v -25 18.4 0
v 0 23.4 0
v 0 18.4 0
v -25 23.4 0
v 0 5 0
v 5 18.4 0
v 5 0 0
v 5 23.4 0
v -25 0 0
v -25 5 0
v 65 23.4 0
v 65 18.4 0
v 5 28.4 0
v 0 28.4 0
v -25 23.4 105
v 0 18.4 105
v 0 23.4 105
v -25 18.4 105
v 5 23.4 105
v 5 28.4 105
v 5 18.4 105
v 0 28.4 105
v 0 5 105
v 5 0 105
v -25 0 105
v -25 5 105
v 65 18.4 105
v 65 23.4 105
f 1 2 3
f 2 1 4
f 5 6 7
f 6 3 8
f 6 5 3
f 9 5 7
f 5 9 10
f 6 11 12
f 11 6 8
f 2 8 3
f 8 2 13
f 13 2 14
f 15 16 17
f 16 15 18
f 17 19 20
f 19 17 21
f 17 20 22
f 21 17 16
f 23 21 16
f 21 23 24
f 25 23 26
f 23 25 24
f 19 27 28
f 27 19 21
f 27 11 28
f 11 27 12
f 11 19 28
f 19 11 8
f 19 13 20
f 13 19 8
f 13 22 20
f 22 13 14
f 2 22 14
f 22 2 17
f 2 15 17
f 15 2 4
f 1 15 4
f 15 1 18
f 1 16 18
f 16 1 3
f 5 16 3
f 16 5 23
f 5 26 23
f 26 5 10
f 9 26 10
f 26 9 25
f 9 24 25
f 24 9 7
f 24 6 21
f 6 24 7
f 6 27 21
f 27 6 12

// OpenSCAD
// 3D-printable pipette clamp holder for an 18 mm shelf.
// Printed lying on its side: 2-D profile in XY, extruded 105 mm along Z.
// In use: +Y is up, +X points away from the shelf, Z is the 105 mm length.

// ---- Dimensions (mm) ----
shelf_thickness = 18;      // shelf thickness the clamp grips
gap = 18.4;                // opening between jaws (shelf + clearance)
jaw_t = 5;                 // jaw thickness (top & bottom)
spine_w = 5;               // spine thickness (x = 0..5)
spine_h = 28.4;            // spine height (y = 0..28.4)
bottom_jaw_x0 = -25;       // bottom jaw starts at x = -25
bottom_jaw_x1 = 5;         // bottom jaw ends at x = 5
top_jaw_x0 = -25;          // top jaw + arm starts at x = -25
top_jaw_x1 = 65;           // top jaw + arm ends at x = 65
extrude_len = 105;         // length along Z (the 3 pipettes)

// Pipette holes: 20 mm dia, through the arm along Y (vertical in use)
hole_d = 20;
hole_x = 42;               // hole centre in X (inside the arm)
hole_z = [17.5, 52.5, 87.5]; // hole centres along Z

$fn = 64;

// ---- 2-D profile (XY plane) ----
// Spine: x 0..5, y 0..28.4
// Bottom jaw: x -25..5, y 0..5
// Top jaw + arm: x -25..65, y 23.4..28.4
module profile() { union() {
    translate([0, 0]) square([spine_w, spine_h]);
    translate([bottom_jaw_x0, 0]) square([bottom_jaw_x1 - bottom_jaw_x0, jaw_t]);
    translate([top_jaw_x0, gap]) square([top_jaw_x1 - top_jaw_x0, jaw_t]);
} }

// ---- Extrude the profile along Z, then drill the 3 pipette holes ----
difference() {
    linear_extrude(extrude_len) profile();

    for (z = hole_z) {
        // Hole axis is along Y (vertical in use).
        // Cylinder default axis is Z, so rotate 90° about X to point it along Y.
        // Place it so it spans the full arm thickness (y 23.4..28.4) with 1 mm
        // overhang on each side to guarantee a clean cut through the arm.
        translate([hole_x, gap - jaw_t - 1, z])
            rotate([90, 0, 0])
                cylinder(h = jaw_t + 2, d = hole_d, $fn = 64);
    }
}
